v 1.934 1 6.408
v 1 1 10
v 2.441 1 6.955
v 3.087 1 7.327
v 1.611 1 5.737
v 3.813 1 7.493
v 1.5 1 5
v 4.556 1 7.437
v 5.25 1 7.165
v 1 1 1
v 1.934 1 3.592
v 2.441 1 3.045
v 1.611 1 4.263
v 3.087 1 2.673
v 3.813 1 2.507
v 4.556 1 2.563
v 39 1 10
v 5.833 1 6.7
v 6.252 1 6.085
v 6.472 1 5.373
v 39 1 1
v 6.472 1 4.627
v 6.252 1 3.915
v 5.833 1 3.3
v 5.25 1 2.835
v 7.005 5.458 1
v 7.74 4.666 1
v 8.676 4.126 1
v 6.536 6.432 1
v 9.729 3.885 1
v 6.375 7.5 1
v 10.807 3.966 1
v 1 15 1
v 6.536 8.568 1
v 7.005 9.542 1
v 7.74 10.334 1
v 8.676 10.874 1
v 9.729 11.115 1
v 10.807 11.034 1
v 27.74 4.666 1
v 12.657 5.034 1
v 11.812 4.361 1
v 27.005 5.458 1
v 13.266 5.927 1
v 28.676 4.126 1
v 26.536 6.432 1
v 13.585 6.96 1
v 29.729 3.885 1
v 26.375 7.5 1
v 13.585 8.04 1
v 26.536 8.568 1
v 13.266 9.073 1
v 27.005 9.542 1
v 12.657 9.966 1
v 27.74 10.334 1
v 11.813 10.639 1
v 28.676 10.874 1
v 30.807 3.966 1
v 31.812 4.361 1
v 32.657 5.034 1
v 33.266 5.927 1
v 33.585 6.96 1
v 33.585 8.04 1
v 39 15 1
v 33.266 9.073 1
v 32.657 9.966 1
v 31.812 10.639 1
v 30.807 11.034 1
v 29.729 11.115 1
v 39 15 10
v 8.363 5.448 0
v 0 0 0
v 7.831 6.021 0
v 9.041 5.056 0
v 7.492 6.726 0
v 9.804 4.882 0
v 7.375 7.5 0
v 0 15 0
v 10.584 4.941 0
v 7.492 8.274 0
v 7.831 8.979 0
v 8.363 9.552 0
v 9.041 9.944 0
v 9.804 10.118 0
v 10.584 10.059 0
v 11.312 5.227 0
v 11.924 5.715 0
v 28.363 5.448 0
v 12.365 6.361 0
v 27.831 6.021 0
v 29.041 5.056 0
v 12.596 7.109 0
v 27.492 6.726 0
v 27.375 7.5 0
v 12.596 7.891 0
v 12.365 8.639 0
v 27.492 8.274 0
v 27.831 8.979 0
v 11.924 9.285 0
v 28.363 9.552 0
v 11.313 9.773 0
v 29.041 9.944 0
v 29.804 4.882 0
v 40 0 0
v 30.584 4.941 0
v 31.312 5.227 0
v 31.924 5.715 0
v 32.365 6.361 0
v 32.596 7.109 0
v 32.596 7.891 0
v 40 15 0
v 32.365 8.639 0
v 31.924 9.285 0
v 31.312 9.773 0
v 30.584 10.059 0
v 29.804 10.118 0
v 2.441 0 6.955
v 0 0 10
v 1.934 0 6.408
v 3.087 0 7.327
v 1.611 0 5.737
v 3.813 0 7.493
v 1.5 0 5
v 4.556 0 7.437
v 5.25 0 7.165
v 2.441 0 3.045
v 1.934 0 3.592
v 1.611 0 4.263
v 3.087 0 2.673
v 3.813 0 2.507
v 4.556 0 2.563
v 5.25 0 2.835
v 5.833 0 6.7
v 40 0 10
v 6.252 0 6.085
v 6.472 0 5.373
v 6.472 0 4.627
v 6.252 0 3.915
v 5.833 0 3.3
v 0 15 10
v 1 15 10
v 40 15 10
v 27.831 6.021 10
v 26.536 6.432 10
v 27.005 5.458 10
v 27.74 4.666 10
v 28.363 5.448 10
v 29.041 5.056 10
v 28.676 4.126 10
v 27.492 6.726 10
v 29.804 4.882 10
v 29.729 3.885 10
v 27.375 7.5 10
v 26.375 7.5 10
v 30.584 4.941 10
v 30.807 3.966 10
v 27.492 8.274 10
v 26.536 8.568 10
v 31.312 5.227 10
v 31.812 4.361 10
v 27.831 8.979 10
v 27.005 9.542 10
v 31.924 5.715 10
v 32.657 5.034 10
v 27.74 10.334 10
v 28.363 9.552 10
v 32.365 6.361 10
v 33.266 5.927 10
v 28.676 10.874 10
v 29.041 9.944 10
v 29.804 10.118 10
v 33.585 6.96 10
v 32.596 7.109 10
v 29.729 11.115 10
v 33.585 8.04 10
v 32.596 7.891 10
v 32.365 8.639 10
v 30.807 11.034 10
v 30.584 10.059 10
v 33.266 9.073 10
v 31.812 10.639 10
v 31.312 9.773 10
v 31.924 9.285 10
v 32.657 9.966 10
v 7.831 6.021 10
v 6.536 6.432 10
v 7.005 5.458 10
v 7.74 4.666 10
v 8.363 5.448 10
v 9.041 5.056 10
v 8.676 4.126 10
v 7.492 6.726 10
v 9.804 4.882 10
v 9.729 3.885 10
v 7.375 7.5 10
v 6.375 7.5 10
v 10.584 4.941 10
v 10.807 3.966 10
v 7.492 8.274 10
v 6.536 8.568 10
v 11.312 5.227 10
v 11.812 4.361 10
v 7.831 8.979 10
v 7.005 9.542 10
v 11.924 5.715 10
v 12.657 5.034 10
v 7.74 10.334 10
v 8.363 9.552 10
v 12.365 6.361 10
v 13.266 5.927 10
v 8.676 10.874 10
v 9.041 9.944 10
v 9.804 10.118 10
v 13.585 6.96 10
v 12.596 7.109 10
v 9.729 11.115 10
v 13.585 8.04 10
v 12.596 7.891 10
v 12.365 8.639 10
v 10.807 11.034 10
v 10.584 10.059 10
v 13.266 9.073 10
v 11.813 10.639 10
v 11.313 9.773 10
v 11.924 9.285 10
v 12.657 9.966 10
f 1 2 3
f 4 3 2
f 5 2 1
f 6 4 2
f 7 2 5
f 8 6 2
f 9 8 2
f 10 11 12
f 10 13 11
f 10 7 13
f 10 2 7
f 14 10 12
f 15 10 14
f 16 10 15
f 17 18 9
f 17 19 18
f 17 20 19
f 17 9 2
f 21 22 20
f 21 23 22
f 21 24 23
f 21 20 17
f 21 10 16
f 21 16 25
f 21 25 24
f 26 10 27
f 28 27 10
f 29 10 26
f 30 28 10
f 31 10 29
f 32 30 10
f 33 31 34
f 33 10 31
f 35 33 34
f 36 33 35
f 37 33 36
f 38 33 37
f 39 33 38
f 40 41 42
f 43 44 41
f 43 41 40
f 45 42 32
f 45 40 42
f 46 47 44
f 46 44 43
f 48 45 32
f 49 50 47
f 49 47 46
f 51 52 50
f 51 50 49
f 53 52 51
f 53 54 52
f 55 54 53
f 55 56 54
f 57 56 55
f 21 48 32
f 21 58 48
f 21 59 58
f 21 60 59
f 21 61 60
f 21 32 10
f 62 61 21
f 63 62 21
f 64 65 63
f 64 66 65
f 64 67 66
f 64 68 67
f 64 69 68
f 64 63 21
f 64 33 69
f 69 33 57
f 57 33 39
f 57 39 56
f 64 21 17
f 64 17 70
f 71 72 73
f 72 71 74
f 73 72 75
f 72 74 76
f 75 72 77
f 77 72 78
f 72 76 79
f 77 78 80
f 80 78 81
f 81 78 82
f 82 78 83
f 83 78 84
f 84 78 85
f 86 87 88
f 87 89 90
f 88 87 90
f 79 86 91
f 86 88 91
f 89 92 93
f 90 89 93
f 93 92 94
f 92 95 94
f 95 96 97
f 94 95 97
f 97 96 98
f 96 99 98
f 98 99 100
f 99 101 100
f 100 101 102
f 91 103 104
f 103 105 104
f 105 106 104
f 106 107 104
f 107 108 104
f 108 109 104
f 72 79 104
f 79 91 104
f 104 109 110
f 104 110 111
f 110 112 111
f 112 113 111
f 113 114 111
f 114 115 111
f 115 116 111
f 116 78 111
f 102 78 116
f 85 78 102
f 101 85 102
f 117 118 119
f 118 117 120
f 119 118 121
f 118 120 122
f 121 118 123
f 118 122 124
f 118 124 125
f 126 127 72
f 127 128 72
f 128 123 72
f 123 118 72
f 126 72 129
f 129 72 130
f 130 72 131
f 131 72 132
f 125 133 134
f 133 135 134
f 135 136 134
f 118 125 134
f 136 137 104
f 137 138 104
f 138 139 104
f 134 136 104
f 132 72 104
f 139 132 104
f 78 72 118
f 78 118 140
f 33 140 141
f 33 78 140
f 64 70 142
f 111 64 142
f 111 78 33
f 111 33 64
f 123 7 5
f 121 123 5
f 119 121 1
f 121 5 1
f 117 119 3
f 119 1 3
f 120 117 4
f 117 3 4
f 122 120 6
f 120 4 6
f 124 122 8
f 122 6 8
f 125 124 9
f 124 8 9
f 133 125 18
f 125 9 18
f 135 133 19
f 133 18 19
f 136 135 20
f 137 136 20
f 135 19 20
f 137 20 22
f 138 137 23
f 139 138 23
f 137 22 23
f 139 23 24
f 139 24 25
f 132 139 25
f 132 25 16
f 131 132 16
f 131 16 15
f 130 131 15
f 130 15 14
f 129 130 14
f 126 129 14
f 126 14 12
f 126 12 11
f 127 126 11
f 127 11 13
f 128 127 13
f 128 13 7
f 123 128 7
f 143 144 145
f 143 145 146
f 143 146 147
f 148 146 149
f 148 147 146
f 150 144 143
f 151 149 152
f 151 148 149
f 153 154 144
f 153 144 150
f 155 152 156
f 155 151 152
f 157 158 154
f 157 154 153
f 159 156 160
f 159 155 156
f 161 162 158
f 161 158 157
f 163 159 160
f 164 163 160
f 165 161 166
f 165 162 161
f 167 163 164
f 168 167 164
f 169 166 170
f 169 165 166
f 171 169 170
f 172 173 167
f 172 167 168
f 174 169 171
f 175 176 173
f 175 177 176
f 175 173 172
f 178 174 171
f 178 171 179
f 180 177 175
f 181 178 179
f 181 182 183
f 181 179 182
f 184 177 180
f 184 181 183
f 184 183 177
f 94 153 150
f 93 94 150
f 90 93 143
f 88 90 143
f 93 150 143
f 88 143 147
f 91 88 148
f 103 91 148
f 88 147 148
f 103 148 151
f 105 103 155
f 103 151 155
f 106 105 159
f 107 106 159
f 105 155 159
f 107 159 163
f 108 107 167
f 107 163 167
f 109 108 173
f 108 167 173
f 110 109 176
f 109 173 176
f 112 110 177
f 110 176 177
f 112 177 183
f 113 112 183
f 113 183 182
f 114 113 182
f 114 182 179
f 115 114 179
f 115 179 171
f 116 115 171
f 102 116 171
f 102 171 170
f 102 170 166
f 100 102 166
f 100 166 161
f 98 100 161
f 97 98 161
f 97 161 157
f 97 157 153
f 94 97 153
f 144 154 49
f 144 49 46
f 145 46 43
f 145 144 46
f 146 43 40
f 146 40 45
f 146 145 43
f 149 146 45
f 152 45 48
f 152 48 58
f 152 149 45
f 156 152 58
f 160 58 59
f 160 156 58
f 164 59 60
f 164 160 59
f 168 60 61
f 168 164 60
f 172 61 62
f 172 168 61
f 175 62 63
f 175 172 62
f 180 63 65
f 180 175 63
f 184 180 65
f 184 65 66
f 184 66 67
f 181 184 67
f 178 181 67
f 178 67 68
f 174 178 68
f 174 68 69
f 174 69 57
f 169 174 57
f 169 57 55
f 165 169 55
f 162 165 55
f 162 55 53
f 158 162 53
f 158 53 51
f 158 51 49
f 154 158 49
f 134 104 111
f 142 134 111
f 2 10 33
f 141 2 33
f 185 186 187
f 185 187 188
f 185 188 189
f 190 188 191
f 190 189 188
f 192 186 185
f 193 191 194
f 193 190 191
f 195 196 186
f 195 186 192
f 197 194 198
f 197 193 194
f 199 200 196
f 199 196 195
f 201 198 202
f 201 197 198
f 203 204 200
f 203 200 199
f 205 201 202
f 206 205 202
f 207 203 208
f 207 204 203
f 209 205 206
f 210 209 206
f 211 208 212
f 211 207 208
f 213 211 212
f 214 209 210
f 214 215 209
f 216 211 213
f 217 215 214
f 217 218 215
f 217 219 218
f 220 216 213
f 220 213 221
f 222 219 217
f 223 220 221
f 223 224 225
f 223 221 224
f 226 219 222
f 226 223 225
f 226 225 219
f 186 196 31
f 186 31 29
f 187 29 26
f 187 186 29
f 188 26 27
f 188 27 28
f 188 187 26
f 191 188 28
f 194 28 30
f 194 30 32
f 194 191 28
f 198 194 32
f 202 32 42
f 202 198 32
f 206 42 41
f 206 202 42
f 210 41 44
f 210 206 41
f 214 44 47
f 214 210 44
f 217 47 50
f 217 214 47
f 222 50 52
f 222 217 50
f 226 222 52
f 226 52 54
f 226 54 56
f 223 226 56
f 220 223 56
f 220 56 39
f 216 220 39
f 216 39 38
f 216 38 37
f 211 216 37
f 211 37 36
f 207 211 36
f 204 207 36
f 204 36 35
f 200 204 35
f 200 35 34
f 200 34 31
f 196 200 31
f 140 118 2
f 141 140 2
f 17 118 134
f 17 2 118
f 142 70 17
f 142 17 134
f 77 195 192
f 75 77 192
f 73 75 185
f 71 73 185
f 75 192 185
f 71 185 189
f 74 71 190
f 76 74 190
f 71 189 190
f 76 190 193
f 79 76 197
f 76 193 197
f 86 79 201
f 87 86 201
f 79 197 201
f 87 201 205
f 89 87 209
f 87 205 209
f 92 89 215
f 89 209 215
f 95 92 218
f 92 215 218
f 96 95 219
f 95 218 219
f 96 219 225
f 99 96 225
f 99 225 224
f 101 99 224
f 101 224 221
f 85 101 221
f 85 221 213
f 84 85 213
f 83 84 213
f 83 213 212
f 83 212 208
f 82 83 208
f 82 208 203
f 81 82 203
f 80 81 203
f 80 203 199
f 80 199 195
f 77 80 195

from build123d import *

# Parameters (mm, degrees)
F0_W     = 40
F0_H     = 15
F1_DEPTH = 10
F2_D     = 5.25
F3_T     = -1
F5_D     = 5
F5_DEPTH = 2
F5_TIP   = 1.5021515476


with BuildPart() as f1:
    # F0 (on Top) → F1 (new body)
    with BuildSketch(Plane.XY):
        with Locations((20, 7.5)):
            Rectangle(F0_W, F0_H)
    extrude(amount=F1_DEPTH)

    # F2 (through all)
    with Locations(Plane(origin=(0, 0, 0), x_dir=(1, 0, 0), z_dir=(0, 0, -1))):
        with Locations((10, -7.5), (30, -7.5)):
            Hole(F2_D / 2)

    # F3
    f3_openings = [f1.faces().sort_by_distance(p)[0] for p in [
        (20, 15, 5),
        (20, 7.5, 10),
    ]]
    offset(amount=F3_T, openings=f3_openings)

    # F5
    with Locations(Plane.XZ):
        with Locations((4, 5)):
            Hole(F5_D / 2, depth=F5_DEPTH)
            with Locations((0, 0, -(F5_DEPTH + F5_TIP / 2))):  # 118° drill point
                Cone(0, F5_D / 2, F5_TIP, mode=Mode.SUBTRACT)


solid = f1.part
